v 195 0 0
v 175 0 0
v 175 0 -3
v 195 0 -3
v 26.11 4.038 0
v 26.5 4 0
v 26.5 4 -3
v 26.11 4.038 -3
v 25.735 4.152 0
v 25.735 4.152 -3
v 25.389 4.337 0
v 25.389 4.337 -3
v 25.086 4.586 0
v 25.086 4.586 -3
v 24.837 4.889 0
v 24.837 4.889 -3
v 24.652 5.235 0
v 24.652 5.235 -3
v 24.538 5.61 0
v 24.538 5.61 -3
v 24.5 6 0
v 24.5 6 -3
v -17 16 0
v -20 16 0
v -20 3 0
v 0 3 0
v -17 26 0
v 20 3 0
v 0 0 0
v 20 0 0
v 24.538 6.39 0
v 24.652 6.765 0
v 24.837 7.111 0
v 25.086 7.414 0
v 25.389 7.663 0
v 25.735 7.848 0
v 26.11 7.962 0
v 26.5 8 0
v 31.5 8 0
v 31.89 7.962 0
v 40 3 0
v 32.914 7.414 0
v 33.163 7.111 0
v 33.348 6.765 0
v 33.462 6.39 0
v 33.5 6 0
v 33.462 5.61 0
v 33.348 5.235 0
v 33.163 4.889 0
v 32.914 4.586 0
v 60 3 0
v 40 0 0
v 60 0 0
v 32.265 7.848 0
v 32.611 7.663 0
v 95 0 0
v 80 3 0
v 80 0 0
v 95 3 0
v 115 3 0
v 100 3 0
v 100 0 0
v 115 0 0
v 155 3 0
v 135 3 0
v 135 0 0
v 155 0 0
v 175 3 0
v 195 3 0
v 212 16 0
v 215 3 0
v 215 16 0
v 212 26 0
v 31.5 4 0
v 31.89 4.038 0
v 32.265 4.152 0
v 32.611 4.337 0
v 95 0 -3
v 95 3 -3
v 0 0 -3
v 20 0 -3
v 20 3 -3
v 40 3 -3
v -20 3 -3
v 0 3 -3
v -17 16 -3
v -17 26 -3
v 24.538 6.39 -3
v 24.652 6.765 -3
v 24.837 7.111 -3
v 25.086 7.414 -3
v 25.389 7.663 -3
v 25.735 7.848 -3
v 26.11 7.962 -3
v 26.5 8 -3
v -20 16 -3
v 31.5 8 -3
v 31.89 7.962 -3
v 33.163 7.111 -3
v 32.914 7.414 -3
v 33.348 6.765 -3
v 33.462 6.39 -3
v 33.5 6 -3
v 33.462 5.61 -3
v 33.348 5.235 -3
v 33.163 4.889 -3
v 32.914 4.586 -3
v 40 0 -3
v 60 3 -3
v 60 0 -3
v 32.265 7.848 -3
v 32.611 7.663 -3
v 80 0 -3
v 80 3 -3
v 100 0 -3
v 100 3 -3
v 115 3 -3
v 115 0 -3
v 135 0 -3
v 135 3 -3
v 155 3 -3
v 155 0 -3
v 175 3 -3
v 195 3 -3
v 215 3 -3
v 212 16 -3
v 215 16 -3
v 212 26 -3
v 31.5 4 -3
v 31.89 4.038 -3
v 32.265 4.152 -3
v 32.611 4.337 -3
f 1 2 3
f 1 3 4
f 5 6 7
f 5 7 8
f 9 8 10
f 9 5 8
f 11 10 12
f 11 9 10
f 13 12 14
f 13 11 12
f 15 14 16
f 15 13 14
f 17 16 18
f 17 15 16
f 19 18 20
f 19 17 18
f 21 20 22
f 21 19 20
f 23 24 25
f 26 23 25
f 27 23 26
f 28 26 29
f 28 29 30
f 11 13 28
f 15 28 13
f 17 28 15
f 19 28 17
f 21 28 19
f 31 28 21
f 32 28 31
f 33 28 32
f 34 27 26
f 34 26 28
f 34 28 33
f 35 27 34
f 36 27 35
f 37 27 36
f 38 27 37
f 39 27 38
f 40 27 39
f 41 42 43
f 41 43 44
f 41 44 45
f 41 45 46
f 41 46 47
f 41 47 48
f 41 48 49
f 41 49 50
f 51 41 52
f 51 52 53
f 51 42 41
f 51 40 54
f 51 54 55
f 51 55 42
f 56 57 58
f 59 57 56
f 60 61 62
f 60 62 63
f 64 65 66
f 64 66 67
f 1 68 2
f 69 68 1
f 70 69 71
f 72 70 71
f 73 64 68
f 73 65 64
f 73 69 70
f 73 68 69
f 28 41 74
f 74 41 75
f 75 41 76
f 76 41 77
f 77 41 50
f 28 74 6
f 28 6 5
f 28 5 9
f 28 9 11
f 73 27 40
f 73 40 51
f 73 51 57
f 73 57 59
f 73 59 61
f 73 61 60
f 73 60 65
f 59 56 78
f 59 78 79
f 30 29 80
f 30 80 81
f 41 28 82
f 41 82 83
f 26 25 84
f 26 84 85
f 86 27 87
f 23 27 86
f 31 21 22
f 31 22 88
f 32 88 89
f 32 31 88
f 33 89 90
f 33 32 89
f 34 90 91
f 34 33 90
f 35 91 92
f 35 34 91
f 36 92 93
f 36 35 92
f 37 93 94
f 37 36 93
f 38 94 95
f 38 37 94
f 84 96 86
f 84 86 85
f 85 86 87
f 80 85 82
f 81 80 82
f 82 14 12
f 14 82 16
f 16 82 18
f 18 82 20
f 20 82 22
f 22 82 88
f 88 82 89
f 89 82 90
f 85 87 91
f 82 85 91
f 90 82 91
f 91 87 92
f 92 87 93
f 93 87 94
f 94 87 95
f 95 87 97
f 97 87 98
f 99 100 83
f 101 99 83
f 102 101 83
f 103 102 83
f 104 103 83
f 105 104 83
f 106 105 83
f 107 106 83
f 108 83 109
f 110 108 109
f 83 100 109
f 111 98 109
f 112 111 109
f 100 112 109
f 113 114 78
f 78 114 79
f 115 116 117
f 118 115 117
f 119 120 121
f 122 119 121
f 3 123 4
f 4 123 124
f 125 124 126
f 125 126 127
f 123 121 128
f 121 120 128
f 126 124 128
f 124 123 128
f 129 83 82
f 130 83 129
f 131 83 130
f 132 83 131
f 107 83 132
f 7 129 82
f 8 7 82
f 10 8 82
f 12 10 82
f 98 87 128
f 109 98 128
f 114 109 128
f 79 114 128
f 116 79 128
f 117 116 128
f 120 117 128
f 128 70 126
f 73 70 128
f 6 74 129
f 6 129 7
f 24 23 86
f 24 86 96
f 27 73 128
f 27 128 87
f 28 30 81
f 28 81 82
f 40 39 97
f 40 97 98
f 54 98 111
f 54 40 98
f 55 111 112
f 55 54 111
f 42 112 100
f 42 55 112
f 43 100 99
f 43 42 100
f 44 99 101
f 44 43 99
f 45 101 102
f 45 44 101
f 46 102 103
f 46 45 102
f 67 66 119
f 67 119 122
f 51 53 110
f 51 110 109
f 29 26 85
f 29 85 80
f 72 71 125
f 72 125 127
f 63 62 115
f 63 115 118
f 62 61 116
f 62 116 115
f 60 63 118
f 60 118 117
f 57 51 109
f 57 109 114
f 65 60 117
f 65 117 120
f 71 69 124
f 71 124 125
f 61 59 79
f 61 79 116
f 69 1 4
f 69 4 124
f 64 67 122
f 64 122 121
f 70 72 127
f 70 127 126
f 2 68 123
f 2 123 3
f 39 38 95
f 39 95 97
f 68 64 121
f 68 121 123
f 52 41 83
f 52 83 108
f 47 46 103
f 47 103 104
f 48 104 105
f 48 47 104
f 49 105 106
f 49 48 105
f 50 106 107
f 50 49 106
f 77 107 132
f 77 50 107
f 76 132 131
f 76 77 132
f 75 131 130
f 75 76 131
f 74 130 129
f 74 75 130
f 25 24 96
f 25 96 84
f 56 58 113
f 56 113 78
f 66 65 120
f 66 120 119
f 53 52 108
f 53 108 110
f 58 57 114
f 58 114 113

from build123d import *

# Parameters (mm, degrees)
F1_DEPTH = 3


with BuildPart() as f1:
    # F0 (on Top) → F1 (new body)
    with BuildSketch(Plane.XY):
        Polygon((97.5, 26), (-17, 26), (-17, 16), (-20, 16), (-20, 3), (0, 3), (0, 0), (20, 0), (20, 3), (40, 3), (40, 0), (60, 0), (60, 3), (80, 3), (80, 0), (95, 0), (95, 3), (97.5, 3), align=None)
        with BuildLine():
            ThreePointArc((24.5, 6), (25.085786, 7.414214), (26.5, 8))
            Line((26.5, 8), (31.5, 8))
            ThreePointArc((31.5, 8), (32.914214, 7.414214), (33.5, 6))
            ThreePointArc((33.5, 6), (32.914214, 4.585786), (31.5, 4))
            Line((31.5, 4), (26.5, 4))
            ThreePointArc((26.5, 4), (25.085786, 4.585786), (24.5, 6))
        make_face(mode=Mode.SUBTRACT)
        Polygon((212, 26), (97.5, 26), (97.5, 3), (100, 3), (100, 0), (115, 0), (115, 3), (135, 3), (135, 0), (155, 0), (155, 3), (175, 3), (175, 0), (195, 0), (195, 3), (215, 3), (215, 16), (212, 16), align=None)
    extrude(amount=-F1_DEPTH)


solid = f1.part
